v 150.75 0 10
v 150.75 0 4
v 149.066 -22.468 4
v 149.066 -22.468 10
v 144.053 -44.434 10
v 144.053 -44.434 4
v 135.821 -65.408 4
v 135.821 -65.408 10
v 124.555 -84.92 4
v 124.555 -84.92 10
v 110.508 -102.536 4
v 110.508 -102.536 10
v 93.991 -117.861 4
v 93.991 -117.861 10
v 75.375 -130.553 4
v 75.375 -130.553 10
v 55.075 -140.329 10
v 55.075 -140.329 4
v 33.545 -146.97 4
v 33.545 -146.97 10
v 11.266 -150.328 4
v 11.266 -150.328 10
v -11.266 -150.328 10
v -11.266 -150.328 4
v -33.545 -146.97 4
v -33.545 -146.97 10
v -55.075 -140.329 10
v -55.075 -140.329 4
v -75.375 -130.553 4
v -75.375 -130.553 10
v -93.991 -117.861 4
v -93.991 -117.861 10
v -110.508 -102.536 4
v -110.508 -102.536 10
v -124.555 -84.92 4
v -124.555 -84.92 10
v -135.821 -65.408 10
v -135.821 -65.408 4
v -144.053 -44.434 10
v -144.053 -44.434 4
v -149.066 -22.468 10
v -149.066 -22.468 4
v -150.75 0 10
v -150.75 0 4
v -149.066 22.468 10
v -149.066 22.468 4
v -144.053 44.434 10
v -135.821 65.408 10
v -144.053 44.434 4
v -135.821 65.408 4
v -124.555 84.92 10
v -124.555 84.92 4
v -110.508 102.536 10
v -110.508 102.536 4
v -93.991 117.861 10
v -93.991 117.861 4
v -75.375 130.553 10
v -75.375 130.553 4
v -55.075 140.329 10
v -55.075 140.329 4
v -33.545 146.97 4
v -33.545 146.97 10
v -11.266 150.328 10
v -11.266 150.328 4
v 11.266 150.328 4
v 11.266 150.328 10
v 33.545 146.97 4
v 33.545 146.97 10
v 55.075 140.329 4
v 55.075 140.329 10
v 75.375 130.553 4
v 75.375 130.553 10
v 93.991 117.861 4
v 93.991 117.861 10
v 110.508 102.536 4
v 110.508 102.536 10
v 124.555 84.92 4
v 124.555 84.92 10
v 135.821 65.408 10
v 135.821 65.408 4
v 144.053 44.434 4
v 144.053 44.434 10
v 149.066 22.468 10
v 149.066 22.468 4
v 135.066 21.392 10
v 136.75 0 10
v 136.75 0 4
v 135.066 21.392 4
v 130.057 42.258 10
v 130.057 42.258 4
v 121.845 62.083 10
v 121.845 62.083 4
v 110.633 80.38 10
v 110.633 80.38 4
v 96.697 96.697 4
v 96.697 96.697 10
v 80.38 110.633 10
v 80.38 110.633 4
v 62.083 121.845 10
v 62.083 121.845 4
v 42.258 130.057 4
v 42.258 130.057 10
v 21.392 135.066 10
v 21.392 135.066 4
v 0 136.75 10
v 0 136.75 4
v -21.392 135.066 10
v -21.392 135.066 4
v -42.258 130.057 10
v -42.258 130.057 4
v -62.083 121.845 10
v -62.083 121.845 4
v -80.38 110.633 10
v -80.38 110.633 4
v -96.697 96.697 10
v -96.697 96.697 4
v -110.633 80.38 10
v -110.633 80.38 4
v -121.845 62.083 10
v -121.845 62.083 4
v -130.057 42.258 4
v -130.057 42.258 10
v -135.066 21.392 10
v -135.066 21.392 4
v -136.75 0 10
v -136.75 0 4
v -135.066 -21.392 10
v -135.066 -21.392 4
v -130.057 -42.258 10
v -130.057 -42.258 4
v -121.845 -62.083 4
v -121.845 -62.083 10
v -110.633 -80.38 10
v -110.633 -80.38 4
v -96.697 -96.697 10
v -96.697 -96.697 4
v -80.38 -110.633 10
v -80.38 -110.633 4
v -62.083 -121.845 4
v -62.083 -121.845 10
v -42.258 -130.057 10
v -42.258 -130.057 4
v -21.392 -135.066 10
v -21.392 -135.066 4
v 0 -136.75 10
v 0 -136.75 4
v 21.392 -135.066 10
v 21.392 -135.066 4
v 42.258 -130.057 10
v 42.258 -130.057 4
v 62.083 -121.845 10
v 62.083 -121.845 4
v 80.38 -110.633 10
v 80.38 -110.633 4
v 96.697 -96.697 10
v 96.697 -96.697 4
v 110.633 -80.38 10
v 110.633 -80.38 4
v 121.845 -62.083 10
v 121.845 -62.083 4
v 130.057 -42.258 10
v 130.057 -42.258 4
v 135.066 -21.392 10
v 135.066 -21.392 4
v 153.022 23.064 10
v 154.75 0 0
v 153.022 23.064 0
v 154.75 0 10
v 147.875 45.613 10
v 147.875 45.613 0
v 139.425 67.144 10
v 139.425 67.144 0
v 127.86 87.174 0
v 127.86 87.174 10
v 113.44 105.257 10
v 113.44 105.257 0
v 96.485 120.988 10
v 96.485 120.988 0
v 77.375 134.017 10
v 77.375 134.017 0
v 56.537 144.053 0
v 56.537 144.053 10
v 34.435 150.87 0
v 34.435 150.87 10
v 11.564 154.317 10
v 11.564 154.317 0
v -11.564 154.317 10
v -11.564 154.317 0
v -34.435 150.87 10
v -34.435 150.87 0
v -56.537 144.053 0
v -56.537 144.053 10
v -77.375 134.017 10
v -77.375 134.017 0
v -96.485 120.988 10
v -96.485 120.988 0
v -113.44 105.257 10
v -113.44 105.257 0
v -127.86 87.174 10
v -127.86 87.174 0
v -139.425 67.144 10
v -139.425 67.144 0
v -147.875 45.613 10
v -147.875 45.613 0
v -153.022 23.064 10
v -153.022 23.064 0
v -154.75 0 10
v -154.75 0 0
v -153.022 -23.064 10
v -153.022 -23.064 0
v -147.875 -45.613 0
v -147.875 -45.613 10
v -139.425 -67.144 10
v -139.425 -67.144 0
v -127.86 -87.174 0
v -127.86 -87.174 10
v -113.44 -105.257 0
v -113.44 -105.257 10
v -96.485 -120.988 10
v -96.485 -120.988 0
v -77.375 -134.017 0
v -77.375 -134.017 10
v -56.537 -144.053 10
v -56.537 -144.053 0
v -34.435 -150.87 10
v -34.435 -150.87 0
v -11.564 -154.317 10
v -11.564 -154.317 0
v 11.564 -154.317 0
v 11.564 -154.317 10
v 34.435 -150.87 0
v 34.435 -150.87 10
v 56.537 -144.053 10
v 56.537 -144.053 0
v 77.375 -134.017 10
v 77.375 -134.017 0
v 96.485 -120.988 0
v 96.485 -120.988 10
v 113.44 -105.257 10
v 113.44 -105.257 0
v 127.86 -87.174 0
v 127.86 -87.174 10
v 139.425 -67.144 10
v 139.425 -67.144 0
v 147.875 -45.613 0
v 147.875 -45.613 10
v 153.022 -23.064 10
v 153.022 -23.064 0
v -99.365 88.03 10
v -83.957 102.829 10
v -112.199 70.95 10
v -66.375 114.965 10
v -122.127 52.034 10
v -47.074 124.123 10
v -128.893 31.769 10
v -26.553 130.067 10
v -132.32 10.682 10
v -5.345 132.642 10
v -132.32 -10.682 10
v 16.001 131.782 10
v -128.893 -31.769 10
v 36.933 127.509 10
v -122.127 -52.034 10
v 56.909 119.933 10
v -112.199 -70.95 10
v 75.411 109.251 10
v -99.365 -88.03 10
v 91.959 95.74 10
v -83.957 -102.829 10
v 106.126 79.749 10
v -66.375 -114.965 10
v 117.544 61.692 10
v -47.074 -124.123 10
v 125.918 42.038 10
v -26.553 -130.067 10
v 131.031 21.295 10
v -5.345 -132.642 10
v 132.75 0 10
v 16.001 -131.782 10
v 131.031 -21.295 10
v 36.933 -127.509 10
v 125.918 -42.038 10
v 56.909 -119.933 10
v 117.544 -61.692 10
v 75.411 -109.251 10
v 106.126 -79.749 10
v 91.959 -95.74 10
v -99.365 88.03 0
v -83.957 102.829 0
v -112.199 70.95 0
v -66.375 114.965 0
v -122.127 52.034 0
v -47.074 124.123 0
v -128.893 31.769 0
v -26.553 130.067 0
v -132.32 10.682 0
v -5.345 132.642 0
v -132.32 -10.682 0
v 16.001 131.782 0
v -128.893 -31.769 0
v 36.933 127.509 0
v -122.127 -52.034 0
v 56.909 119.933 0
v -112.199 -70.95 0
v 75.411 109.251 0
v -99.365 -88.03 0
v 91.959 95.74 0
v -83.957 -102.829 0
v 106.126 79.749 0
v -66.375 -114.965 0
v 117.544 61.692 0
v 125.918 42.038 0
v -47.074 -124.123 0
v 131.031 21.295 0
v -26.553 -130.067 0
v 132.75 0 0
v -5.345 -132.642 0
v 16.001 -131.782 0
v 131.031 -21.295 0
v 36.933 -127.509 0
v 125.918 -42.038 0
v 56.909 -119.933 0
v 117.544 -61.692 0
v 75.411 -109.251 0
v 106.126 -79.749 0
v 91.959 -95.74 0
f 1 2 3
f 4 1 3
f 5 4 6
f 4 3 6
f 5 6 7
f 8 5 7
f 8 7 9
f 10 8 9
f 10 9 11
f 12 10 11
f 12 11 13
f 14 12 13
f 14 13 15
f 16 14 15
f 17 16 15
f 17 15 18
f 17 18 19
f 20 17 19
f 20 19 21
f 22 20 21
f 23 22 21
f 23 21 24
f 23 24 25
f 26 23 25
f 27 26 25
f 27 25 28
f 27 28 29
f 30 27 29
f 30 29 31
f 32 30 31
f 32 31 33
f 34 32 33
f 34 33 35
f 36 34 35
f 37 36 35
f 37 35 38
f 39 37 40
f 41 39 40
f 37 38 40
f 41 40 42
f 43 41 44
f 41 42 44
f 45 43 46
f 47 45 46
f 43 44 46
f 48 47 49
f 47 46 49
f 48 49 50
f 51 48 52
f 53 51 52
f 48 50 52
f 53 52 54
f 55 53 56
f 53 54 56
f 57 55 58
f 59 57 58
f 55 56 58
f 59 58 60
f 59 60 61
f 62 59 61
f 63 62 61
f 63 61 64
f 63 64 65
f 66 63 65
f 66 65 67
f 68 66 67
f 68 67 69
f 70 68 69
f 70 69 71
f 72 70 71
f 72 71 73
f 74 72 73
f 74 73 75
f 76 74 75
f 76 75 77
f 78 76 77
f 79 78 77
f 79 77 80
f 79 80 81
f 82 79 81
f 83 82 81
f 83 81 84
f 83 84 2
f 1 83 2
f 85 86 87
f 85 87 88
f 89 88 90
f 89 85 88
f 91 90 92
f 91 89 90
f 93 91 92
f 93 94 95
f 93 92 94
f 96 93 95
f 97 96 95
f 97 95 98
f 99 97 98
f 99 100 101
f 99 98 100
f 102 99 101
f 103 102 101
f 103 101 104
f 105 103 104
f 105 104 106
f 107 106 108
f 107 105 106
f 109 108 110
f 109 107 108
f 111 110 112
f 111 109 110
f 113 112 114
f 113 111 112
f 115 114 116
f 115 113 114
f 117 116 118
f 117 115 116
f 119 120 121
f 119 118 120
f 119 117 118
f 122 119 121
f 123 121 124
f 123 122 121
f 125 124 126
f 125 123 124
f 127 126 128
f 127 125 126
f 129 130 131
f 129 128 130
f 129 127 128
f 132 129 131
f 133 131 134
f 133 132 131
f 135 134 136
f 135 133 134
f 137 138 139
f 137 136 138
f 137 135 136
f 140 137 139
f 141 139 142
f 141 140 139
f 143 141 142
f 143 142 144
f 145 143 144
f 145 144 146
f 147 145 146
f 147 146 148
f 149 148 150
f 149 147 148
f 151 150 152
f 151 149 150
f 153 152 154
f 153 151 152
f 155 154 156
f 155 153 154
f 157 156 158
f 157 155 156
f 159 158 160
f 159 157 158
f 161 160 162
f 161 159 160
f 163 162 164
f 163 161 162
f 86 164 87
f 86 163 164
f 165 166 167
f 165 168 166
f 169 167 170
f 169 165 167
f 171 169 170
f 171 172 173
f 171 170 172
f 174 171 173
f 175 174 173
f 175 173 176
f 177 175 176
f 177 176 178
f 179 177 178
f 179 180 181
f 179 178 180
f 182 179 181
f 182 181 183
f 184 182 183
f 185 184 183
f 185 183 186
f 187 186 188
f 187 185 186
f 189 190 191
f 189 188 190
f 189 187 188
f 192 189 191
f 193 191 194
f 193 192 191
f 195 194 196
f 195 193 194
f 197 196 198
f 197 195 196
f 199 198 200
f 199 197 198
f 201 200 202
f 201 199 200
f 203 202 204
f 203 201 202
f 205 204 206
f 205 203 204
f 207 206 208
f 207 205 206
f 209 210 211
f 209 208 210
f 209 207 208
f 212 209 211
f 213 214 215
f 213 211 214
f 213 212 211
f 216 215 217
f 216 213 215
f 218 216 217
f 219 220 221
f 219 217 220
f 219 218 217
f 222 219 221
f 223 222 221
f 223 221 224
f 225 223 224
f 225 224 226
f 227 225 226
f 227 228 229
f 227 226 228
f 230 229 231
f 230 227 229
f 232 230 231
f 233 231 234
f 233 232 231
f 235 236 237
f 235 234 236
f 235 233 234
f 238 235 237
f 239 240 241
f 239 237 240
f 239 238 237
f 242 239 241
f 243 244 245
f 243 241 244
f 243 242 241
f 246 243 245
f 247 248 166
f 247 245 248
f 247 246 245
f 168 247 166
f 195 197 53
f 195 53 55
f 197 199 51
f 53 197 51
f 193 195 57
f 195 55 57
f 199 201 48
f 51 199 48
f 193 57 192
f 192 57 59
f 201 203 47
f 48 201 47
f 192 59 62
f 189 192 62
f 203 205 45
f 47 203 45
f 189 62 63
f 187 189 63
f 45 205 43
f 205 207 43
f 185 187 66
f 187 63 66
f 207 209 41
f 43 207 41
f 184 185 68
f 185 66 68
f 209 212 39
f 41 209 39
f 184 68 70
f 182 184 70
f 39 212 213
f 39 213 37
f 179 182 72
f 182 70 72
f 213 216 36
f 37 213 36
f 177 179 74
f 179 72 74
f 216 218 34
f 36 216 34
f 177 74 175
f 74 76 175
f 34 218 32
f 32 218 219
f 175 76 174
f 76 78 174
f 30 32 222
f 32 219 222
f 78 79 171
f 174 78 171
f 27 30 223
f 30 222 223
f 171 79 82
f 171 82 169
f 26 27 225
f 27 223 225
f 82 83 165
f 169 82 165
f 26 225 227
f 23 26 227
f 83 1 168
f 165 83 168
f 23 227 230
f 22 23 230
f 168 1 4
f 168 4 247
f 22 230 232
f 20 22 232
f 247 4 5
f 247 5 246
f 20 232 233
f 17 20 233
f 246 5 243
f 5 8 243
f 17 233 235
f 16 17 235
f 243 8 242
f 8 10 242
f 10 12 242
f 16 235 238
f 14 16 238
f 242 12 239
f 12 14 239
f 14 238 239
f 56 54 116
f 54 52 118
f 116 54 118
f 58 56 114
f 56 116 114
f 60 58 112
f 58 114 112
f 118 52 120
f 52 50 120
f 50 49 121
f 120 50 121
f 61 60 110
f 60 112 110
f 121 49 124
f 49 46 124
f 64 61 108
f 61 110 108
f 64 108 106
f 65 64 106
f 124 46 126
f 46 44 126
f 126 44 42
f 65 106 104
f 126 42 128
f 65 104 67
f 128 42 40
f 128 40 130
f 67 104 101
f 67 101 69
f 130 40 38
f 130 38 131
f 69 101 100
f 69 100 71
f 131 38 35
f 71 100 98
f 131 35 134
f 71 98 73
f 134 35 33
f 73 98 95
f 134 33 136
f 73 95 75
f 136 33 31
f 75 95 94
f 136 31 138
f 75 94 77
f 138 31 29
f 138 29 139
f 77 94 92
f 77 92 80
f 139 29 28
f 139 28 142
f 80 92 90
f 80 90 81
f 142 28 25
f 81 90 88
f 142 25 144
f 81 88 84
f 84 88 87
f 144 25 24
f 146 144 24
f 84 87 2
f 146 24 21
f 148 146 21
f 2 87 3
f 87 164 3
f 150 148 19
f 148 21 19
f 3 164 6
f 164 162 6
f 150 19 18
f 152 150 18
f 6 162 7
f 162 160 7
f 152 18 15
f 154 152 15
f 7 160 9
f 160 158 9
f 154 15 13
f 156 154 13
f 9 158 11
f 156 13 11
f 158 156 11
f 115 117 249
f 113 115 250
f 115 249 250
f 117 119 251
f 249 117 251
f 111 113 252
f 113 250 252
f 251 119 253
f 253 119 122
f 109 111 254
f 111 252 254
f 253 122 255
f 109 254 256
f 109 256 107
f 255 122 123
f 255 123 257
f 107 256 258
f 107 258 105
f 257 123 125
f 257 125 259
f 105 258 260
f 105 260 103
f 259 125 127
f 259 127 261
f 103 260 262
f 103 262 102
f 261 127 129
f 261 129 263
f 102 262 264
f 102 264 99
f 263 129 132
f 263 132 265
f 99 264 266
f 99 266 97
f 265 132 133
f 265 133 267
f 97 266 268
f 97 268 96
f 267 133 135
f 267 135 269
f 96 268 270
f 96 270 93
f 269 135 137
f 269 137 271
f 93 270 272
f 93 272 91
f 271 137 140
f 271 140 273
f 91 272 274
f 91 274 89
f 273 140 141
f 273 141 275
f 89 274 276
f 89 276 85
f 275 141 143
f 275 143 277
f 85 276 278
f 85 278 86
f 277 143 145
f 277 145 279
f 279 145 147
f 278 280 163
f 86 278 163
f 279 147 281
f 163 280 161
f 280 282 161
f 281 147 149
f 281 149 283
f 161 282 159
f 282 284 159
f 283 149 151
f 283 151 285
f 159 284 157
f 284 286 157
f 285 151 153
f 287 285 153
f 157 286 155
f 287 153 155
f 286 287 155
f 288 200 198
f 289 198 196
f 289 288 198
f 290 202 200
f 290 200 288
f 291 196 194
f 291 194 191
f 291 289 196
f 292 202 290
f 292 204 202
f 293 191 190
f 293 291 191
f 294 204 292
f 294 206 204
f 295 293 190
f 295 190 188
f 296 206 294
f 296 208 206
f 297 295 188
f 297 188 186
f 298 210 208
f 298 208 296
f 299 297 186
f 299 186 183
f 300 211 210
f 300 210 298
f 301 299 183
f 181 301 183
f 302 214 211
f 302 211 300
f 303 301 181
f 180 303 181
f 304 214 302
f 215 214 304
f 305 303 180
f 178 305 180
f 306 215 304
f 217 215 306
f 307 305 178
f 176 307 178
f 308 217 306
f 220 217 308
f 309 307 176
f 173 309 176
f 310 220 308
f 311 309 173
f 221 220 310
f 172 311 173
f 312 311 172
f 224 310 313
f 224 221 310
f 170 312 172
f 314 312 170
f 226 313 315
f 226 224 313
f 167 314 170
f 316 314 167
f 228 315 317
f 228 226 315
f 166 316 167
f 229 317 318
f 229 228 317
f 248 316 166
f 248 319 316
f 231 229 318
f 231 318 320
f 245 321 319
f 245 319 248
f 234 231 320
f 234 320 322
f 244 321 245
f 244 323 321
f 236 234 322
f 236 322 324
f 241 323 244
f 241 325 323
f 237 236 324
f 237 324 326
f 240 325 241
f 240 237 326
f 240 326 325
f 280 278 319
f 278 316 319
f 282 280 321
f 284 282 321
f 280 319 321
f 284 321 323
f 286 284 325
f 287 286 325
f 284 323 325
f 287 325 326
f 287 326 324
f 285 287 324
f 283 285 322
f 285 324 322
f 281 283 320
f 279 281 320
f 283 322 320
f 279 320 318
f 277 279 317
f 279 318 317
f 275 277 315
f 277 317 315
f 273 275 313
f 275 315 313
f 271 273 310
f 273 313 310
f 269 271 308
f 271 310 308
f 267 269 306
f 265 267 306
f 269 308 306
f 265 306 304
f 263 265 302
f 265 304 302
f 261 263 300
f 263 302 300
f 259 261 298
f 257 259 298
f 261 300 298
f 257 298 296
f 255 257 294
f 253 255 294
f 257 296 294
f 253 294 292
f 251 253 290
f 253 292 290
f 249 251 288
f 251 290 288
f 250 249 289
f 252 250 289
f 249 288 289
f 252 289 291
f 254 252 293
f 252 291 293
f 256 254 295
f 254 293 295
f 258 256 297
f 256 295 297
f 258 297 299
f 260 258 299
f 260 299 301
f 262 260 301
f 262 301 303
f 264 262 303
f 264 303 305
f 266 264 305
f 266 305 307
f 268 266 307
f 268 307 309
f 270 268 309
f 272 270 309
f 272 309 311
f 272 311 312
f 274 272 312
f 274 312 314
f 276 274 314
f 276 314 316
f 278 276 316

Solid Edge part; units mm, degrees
sketch "Sketch1" plane through (0, 0, 0) normal (0, -1, 0) x (1, 0, 0)
  line L0 (132.75, 0) -> (154.75, 0)
  line L1 (154.75, 0) -> (154.75, 10)
  line L2 (154.75, 10) -> (150.75, 10)
  line L3 (150.75, 10) -> (150.75, 4)
  line L4 (150.75, 4) -> (136.75, 4)
  line L5 (136.75, 4) -> (136.75, 10)
  line L6 (136.75, 10) -> (132.75, 10)
  line L7 (132.75, 10) -> (132.75, 0)
  dimension "D1" = 4
  dimension "D2" = 4
  dimension "D3" = 14
  dimension "D4" = 10
  dimension "D5" = 4
  dimension "D6" = 154.75
revolve "RevolvedProtrusion1" add sketch "Sketch1" angle 360 about axis through (0, 0, 54) along (0, 0, -1)
properties material "ABS Plastic, high impact"
